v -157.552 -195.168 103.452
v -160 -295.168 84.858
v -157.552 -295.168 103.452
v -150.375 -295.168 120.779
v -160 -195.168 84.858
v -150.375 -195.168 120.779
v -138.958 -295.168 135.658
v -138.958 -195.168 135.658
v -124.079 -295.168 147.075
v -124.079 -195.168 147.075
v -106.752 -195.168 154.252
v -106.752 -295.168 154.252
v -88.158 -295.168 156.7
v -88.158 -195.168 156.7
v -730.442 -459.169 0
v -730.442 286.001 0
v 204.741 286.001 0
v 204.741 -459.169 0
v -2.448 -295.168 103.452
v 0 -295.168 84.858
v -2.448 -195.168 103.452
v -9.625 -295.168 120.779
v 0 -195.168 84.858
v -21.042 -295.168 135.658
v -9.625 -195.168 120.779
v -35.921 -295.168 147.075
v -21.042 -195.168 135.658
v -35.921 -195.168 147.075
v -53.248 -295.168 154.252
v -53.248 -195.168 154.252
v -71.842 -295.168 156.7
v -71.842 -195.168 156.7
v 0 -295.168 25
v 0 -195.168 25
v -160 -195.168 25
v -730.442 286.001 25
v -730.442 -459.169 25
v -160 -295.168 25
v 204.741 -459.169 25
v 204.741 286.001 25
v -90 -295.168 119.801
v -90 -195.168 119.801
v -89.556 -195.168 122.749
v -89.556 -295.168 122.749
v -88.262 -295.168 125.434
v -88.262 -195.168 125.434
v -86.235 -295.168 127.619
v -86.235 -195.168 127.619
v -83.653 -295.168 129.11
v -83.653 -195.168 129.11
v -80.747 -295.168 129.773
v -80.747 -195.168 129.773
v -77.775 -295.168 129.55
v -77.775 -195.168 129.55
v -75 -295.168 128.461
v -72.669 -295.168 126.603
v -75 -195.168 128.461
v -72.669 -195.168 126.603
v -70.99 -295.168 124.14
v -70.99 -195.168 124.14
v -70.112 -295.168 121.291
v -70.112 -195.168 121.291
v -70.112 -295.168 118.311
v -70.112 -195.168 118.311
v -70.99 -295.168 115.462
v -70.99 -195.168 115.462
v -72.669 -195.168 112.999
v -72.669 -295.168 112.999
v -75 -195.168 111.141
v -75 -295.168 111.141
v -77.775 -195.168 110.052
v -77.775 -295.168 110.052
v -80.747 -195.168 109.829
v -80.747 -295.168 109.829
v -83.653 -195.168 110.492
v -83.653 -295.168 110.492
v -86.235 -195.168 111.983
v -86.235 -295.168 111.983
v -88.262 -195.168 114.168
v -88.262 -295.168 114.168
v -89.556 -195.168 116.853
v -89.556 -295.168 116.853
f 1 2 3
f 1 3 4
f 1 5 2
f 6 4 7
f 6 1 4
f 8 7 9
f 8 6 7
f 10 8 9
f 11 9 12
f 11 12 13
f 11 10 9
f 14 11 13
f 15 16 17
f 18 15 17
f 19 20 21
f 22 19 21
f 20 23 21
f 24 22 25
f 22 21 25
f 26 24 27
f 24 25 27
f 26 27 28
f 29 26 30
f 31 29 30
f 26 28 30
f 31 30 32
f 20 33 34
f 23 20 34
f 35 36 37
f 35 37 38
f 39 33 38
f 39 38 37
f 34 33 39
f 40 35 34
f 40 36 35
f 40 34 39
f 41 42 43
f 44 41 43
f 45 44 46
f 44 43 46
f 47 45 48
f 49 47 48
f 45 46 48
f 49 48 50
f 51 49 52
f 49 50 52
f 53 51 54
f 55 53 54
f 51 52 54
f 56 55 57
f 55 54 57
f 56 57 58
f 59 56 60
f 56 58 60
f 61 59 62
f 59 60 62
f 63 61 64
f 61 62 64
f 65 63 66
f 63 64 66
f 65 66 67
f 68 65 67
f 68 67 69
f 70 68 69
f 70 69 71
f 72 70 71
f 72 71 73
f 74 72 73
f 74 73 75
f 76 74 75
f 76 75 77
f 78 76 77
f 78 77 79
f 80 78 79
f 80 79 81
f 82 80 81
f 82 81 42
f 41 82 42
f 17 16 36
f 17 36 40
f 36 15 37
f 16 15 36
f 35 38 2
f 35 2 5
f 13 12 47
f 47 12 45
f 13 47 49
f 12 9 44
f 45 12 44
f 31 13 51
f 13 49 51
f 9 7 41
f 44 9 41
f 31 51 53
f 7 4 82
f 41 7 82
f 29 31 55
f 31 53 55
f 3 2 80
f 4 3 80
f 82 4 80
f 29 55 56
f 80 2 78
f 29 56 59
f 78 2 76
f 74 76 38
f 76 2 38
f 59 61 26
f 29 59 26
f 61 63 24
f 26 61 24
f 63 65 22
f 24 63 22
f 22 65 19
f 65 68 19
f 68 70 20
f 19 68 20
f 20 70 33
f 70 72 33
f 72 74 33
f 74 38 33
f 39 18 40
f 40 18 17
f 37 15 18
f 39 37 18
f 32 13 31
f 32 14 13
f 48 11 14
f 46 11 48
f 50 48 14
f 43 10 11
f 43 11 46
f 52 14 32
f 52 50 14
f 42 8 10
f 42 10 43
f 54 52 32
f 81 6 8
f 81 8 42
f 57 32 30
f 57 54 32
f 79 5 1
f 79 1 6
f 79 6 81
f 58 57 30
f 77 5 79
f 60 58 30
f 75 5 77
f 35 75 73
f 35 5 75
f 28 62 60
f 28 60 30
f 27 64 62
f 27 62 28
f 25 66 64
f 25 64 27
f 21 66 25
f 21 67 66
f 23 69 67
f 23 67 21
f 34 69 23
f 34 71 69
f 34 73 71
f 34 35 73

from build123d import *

# Parameters (mm, degrees)
F0_W     = 935.182943
F0_H     = 745.169759
F1_DEPTH = 25
F2_W     = 160
F2_H     = 100
F3_DEPTH = 131.70007
F5_D     = 20
F6_R     = 71.842191


with BuildPart() as f1:
    # F0 (on Top) → F1 (new body)
    with BuildSketch(Plane.XY):
        with Locations((-262.850217, -86.583943)):
            Rectangle(F0_W, F0_H)
    extrude(amount=F1_DEPTH)

    # F2 (on face) → F3 (join)
    with BuildSketch(Plane.XY.offset(25)):
        with Locations((-80, -245.168384)):
            Rectangle(F2_W, F2_H)
    extrude(amount=F3_DEPTH)

    # F5 (through all)
    with Locations(Plane.XZ.offset(295.168384)):
        with Locations((-80.000006, 119.801037)):
            Hole(F5_D / 2)

    # F6
    f6_edges = [f1.edges().sort_by_distance(p)[0] for p in [
        (0, -245.168384, 156.70007),
        (-160, -245.168384, 156.70007),
    ]]
    fillet(f6_edges, radius=F6_R)


solid = f1.part
